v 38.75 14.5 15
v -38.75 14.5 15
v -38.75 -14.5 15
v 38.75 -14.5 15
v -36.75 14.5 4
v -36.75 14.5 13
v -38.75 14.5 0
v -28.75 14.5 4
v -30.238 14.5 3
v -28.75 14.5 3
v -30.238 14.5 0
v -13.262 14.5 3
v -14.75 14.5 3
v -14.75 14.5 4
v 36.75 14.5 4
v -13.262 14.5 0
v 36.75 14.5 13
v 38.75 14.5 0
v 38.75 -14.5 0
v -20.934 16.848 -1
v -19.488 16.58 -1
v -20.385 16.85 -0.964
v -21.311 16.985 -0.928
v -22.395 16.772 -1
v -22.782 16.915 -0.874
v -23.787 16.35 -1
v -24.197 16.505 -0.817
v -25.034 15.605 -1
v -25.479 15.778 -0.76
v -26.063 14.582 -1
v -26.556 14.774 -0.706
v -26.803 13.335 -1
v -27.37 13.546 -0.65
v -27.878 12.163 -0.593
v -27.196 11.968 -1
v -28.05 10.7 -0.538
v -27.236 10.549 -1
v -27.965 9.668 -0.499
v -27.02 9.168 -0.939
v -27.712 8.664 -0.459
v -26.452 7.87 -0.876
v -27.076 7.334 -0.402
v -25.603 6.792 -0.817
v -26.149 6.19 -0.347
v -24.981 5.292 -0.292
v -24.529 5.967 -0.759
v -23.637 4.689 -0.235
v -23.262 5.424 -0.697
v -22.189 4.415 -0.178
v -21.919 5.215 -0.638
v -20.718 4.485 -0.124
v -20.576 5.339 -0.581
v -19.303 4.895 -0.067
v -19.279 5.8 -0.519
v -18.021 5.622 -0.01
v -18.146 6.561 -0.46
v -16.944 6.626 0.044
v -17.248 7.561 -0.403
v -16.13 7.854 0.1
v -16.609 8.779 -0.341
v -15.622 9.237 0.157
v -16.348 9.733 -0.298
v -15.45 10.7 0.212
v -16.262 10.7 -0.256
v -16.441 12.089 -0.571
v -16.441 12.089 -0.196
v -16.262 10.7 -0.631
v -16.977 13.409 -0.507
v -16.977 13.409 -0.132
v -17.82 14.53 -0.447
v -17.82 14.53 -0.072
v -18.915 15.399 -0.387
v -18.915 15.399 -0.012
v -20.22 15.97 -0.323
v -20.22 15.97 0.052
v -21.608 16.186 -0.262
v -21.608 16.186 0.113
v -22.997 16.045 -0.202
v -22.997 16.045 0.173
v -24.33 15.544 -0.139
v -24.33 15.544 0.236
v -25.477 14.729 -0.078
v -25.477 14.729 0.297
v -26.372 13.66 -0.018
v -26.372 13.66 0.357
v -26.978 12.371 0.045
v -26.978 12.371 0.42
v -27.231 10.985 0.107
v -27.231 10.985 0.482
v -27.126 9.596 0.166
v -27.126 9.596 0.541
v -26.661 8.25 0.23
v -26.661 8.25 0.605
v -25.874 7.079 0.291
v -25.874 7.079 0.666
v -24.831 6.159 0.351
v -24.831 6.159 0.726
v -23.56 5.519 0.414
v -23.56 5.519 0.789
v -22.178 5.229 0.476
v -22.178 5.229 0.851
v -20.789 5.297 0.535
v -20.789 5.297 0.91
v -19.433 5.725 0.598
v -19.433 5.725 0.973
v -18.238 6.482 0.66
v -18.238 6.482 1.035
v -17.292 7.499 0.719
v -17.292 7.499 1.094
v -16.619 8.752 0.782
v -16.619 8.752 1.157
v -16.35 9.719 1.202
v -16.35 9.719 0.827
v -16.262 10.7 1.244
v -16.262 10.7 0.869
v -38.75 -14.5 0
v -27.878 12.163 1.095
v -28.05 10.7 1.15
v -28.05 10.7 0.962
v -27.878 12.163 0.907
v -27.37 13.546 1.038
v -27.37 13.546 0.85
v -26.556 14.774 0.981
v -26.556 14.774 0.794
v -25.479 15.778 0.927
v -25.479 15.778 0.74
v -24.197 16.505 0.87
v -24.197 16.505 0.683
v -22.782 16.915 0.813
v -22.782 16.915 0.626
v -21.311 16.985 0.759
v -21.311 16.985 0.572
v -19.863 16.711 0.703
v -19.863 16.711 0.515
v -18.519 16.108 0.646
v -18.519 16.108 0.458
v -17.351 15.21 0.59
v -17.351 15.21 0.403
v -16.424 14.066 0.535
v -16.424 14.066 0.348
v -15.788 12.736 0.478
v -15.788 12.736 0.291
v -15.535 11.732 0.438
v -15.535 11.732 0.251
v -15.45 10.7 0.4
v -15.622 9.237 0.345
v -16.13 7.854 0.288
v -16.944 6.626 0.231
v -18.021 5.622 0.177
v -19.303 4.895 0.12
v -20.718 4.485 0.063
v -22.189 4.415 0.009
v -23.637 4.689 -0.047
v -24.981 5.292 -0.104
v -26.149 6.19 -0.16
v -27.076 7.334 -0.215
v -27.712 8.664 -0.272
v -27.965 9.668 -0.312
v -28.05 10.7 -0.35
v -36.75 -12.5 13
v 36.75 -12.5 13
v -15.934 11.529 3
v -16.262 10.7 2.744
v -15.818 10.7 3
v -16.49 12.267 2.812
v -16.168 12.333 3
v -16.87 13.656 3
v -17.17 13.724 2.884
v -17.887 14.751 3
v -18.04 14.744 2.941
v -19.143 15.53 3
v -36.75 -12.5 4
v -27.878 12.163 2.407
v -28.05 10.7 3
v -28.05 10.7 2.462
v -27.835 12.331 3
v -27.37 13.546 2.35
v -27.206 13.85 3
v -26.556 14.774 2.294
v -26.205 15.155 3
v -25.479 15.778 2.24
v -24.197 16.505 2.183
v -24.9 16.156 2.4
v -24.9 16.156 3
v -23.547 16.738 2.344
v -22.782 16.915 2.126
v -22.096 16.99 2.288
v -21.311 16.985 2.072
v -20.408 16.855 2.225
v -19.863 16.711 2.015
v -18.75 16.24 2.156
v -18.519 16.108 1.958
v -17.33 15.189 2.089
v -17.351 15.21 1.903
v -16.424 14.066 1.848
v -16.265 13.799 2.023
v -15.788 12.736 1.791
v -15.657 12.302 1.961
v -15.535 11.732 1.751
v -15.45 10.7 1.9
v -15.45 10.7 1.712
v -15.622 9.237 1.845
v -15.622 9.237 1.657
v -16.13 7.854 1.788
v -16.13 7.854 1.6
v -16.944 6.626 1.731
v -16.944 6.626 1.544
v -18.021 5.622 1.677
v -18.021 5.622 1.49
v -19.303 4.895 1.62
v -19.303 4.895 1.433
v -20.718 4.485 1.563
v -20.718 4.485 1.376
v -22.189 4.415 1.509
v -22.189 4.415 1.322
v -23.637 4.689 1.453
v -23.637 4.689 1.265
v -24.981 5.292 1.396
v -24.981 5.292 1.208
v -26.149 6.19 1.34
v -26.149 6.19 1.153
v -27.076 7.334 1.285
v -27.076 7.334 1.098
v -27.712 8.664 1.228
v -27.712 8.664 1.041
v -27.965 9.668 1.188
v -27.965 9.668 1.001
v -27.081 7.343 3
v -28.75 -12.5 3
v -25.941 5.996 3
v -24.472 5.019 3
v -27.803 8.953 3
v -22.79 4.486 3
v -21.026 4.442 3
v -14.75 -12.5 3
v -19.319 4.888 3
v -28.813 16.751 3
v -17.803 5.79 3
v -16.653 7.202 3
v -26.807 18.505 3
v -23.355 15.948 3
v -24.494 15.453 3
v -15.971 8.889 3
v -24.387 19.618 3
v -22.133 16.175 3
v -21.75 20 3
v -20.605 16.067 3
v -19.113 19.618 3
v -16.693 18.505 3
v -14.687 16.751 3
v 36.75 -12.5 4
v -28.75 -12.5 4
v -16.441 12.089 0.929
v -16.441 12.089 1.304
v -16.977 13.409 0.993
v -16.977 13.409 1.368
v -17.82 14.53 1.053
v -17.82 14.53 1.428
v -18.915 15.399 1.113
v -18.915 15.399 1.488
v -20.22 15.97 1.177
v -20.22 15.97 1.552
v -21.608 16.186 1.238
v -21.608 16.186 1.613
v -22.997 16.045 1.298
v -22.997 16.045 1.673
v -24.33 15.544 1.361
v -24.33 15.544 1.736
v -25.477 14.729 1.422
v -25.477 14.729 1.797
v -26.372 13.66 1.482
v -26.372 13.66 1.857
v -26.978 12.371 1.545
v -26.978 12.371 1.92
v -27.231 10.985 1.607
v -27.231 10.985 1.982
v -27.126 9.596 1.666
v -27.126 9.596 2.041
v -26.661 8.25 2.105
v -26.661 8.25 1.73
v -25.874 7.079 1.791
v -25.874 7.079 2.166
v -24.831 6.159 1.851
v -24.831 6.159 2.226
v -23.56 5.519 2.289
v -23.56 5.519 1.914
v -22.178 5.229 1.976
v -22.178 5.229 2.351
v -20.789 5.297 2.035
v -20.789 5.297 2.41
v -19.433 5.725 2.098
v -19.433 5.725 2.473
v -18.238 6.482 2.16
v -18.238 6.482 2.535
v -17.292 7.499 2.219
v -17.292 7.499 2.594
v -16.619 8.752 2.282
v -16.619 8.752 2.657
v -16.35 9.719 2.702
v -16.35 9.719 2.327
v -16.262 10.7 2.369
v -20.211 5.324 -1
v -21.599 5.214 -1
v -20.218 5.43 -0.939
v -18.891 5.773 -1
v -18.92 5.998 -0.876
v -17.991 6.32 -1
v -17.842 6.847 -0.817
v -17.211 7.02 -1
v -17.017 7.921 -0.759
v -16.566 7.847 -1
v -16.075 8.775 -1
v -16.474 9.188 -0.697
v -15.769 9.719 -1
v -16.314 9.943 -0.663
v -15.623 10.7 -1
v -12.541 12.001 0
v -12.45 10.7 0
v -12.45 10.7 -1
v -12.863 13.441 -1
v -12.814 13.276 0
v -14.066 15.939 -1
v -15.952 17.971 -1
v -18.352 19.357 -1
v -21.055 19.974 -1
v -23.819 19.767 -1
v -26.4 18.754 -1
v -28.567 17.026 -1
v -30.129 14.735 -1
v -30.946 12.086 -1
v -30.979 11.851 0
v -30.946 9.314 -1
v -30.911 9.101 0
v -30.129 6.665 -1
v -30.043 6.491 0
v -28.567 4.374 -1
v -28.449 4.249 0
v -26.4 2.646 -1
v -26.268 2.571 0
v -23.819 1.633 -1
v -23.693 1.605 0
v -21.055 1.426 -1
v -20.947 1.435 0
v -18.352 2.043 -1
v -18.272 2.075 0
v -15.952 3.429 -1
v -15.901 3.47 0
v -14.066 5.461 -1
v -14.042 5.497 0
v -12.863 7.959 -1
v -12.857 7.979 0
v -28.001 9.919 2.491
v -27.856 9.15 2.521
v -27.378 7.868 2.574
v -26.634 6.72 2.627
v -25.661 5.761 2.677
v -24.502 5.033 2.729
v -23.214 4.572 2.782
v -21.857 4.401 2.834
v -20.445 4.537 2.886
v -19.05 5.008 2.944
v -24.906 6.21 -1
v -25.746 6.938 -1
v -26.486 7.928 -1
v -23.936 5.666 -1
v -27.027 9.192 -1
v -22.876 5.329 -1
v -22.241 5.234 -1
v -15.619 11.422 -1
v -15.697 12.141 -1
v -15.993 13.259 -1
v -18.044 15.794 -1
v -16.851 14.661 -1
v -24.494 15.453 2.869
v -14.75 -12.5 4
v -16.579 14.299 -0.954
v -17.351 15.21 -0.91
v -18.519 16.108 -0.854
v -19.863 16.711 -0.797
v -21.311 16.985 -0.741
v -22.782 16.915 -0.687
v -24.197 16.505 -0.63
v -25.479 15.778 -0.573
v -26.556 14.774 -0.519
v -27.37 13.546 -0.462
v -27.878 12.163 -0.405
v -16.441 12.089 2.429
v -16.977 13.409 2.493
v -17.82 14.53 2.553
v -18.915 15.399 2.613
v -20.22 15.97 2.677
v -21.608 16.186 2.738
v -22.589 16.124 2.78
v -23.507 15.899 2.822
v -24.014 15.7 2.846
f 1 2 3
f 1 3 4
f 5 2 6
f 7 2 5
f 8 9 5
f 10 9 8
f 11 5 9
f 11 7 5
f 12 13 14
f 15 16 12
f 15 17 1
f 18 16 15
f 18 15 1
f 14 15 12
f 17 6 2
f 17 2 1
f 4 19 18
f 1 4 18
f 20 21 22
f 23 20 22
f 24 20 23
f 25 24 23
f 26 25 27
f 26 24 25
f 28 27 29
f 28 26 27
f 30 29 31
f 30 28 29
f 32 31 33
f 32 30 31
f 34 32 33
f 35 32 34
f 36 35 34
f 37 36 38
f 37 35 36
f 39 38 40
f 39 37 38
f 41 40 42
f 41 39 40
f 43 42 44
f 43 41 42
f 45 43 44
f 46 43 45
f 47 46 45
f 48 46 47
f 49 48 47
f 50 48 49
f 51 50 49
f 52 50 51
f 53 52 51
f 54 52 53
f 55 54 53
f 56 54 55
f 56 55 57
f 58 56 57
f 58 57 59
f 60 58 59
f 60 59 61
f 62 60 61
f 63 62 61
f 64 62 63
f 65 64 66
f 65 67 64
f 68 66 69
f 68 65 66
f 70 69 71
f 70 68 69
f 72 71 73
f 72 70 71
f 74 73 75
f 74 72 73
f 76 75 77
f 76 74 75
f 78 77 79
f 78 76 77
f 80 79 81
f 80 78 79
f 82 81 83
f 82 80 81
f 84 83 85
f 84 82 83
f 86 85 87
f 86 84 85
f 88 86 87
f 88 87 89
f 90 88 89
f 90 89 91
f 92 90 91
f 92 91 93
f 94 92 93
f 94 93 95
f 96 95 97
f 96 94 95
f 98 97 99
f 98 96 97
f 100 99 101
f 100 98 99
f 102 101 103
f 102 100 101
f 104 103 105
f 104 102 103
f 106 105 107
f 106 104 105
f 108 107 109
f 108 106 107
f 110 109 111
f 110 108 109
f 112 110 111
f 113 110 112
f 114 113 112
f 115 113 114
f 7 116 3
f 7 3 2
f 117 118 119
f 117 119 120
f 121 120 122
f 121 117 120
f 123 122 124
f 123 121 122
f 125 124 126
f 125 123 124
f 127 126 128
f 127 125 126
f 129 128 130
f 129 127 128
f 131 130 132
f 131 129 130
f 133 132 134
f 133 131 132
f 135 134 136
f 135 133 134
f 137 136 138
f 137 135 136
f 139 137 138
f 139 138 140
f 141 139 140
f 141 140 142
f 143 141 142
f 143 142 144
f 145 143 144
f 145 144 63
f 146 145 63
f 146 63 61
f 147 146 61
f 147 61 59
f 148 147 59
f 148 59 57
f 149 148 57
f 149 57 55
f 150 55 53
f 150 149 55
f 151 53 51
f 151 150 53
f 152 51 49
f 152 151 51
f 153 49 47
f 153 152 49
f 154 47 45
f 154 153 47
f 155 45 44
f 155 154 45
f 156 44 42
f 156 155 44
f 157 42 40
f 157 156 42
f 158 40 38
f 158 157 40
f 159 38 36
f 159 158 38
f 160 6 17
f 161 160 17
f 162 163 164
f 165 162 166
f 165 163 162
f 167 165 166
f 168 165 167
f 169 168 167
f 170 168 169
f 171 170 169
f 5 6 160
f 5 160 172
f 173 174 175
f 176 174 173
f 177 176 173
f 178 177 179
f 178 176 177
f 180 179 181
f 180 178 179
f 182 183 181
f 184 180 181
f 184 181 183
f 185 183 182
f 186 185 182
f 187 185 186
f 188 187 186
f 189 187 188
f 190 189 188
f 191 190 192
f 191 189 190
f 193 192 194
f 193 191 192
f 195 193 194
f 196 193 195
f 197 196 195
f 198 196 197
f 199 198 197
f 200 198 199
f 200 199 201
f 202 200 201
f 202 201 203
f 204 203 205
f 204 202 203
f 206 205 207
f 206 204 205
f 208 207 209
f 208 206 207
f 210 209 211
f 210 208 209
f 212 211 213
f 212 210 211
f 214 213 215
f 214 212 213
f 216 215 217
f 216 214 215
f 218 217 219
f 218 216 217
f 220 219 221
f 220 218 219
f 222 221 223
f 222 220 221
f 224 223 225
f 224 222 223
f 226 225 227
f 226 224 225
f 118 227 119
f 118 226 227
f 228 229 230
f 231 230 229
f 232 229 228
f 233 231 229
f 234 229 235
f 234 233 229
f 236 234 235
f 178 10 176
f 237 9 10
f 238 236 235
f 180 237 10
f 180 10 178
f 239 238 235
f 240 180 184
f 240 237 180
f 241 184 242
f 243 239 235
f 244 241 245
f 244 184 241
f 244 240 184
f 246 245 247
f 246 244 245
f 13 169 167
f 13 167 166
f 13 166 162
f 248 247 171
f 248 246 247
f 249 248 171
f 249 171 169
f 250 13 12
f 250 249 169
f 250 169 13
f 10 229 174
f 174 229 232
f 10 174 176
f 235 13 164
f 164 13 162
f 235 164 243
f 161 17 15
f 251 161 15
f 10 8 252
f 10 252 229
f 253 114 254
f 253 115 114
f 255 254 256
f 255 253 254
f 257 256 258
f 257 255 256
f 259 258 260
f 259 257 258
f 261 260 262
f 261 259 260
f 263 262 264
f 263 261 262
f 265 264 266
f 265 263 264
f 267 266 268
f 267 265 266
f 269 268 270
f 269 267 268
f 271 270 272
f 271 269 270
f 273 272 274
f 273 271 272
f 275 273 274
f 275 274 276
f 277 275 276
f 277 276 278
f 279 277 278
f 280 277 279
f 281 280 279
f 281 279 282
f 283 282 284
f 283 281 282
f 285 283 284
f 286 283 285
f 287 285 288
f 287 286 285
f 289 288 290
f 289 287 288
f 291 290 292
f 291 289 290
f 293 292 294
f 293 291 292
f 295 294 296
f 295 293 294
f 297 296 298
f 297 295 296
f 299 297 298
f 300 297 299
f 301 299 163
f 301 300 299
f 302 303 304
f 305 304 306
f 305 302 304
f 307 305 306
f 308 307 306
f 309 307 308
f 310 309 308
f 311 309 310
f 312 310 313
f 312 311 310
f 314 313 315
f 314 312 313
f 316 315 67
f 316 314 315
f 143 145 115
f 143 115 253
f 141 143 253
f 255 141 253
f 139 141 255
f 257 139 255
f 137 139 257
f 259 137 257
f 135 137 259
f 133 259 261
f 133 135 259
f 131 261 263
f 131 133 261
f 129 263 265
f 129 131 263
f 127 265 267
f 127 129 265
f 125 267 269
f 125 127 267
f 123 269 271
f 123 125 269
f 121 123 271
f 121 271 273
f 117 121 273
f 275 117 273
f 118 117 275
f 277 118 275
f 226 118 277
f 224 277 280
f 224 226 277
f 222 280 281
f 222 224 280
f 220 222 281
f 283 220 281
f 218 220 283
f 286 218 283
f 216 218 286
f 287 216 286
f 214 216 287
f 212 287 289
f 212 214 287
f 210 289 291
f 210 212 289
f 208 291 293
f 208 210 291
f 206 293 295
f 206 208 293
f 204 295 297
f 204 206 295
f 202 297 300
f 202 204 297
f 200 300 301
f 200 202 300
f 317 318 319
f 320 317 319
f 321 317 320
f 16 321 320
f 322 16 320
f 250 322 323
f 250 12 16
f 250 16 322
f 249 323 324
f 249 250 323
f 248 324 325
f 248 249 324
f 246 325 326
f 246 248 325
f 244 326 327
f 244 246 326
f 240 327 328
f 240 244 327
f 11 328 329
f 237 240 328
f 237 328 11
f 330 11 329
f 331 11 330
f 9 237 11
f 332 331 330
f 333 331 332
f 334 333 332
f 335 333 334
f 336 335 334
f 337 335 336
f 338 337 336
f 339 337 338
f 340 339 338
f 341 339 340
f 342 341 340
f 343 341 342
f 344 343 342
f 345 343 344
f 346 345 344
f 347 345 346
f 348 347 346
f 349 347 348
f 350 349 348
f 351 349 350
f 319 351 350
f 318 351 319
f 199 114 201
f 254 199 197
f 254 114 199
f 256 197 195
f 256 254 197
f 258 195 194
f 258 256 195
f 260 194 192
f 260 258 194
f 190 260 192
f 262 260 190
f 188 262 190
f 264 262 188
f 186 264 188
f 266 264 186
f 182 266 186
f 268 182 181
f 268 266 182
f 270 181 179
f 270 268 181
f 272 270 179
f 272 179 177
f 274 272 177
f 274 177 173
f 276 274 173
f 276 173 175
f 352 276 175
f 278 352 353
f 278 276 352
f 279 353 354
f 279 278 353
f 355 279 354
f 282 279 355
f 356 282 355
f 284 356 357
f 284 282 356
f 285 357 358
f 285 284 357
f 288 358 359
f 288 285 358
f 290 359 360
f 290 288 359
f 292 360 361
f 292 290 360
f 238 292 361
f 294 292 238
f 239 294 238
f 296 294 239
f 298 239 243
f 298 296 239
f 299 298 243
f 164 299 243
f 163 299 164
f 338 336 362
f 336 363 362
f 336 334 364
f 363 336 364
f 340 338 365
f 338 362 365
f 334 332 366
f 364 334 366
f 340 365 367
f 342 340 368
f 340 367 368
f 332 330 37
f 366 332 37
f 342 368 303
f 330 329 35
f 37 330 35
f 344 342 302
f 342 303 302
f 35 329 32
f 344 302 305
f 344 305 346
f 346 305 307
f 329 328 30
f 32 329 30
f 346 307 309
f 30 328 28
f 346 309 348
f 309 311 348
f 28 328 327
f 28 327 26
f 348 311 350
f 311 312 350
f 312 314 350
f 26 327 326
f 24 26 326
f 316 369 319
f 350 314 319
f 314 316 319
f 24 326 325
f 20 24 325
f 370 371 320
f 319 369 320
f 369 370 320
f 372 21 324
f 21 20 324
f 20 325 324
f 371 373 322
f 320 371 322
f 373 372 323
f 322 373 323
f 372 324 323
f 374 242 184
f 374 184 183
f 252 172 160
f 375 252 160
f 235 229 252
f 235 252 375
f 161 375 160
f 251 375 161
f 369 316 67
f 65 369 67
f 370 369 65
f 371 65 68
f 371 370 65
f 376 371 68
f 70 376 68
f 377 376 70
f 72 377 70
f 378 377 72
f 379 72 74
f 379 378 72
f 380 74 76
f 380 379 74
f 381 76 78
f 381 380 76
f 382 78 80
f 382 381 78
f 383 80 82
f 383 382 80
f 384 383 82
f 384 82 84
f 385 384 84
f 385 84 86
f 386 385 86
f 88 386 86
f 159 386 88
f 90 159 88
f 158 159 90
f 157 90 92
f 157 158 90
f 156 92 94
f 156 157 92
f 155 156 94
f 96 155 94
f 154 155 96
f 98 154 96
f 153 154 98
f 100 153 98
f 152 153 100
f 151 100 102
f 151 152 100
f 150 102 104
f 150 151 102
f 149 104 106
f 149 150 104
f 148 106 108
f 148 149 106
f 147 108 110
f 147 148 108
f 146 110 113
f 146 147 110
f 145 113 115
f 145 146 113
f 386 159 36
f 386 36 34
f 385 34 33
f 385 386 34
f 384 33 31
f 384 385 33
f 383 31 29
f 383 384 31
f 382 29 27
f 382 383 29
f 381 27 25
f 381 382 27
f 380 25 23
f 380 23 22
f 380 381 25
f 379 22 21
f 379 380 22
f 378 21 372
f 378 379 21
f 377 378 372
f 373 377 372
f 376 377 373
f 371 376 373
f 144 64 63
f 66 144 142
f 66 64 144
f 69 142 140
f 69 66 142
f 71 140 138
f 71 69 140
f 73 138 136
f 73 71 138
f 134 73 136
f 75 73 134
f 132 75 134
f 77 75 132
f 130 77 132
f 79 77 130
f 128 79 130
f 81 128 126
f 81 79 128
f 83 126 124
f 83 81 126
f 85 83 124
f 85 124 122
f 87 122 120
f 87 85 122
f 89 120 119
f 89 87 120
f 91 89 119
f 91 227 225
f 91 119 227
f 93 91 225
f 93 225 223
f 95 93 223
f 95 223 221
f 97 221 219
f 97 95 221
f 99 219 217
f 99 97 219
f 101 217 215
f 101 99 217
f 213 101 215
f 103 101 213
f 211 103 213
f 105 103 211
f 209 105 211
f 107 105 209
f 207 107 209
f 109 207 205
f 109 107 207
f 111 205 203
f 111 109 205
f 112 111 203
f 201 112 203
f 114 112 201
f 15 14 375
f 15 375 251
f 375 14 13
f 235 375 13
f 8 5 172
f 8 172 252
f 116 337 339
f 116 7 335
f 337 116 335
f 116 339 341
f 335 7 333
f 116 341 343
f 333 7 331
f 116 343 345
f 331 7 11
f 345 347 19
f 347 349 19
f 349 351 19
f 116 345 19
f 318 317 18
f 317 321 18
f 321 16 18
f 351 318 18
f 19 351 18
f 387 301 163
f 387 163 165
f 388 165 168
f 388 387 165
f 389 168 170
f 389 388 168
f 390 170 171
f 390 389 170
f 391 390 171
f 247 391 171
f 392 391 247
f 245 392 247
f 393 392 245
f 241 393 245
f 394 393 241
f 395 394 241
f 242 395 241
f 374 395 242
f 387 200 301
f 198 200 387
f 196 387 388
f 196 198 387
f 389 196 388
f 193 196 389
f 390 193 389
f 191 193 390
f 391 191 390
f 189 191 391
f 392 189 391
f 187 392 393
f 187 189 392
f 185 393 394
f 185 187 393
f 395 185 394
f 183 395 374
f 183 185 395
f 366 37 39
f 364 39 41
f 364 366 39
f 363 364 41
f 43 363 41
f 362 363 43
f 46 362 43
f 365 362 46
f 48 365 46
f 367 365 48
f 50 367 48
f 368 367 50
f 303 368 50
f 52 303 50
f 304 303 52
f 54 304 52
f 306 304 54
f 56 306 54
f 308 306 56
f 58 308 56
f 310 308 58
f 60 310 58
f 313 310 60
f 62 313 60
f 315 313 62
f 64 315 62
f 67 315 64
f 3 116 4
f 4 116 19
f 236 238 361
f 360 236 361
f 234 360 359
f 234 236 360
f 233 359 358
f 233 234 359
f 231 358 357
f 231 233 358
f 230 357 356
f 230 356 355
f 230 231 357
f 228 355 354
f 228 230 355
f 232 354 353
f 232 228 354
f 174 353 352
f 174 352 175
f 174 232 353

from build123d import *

# Parameters (mm, degrees)
SKIZZE1_W                            = 77.5
SKIZZE1_H                            = 29
AUFSATZ_LINEAR_AUSTRAGEN1_DEPTH      = 15
SKIZZE2_W                            = 73.5
SKIZZE2_H                            = 9
SCHNITT_LINEAR_AUSTRAGEN2_DEPTH      = 27
SKIZZE3_W                            = 14
SKIZZE3_H                            = 3.775324495
SCHNITT_LINEAR_AUSTRAGEN3_DEPTH      = 27
SKIZZE4_R                            = 9.3
AUFSATZ_LINEAR_AUSTRAGEN2_DEPTH      = 4
SCHNITT_LINEAR_AUSTRAGEN4_DEPTH      = 4
SCHNITT_LINEAR_AUSTRAGEN4_DEPTH_BACK = 4
SKIZZE5_R                            = 6.3
GEWINDE1_PITCH                       = 1.5
SKIZZE8_R                            = 6.762792794
SCHNITT_LINEAR_AUSTRAGEN5_DEPTH      = 3
SKIZZE9_R                            = 8.045184368
SCHNITT_LINEAR_AUSTRAGEN6_DEPTH      = 3


with BuildPart() as part:
    # Skizze1 → Aufsatz-Linear austragen1 (new body)
    with BuildSketch(Plane.XY):
        Rectangle(SKIZZE1_W, SKIZZE1_H)
    extrude(amount=AUFSATZ_LINEAR_AUSTRAGEN1_DEPTH)

    # Skizze2 → Schnitt-Linear austragen2 (cut)
    with BuildSketch(Plane(origin=(0, 14.5, 0), x_dir=(1, 0, 0), z_dir=(0, 1, 0))):
        with Locations((0, -8.5)):
            Rectangle(SKIZZE2_W, SKIZZE2_H)
    extrude(amount=-SCHNITT_LINEAR_AUSTRAGEN2_DEPTH, mode=Mode.SUBTRACT)

    # Skizze3 → Schnitt-Linear austragen3 (cut)
    with BuildSketch(Plane(origin=(0, 14.5, 0), x_dir=(1, 0, 0), z_dir=(0, 1, 0))):
        with Locations((-21.75, -4.887662247)):
            Rectangle(SKIZZE3_W, SKIZZE3_H)
    extrude(amount=-SCHNITT_LINEAR_AUSTRAGEN3_DEPTH, mode=Mode.SUBTRACT)

    # Skizze4 → Aufsatz-Linear austragen2 (add)
    with BuildSketch(Plane.XY.offset(3)):
        with Locations((-21.75, 10.7)):
            Circle(SKIZZE4_R)
    extrude(amount=-AUFSATZ_LINEAR_AUSTRAGEN2_DEPTH)

    # Skizze5 → Schnitt-Linear austragen4 (cut, two sides: drawn at the far end of the back side and taken through both)
    with BuildSketch(Plane(origin=(0, 0, 0), x_dir=(-1, 0, 0), z_dir=(0, 0, -1)).offset(-SCHNITT_LINEAR_AUSTRAGEN4_DEPTH_BACK)):
        with Locations((21.75, 10.7)):
            Circle(SKIZZE5_R)
    extrude(amount=SCHNITT_LINEAR_AUSTRAGEN4_DEPTH + SCHNITT_LINEAR_AUSTRAGEN4_DEPTH_BACK, mode=Mode.SUBTRACT)

    # Gewinde1: the profile of Gewindeprofil1 profile screwed along a right-hand helix of 3.333333 turns, 8 arcs to a turn; built about Z, then put on its axis
    gewinde1_z = Axis((0, 0, 0), (0, 0, 1))
    gewinde1_corners = [(6.3003, 0, -0.000173205), (6.3003, 0, 1.312673201), (5.488101188, 0, 0.843749998), (5.488101188, 0, 0.468749998)]
    with BuildLine(mode=Mode.PRIVATE) as gewinde1_profile:
        Line(gewinde1_corners[0], gewinde1_corners[1])
        Line(gewinde1_corners[1], gewinde1_corners[2])
        Line(gewinde1_corners[2], gewinde1_corners[3])
        Line(gewinde1_corners[3], gewinde1_corners[0])
    gewinde1_cap = Face(gewinde1_profile.wire())
    gewinde1_turn_angles = [0, 22.5, 45, 67.5, 90, 112.5, 135, 157.5, 180, 202.5, 225, 247.5, 270, 292.5, 315, 337.5, 360]
    gewinde1_turn_weights = [1, 0.9238795325112867, 1, 0.9238795325112867, 1, 0.9238795325112867, 1, 0.9238795325112867, 1, 0.9238795325112867, 1, 0.9238795325112867, 1, 0.9238795325112867, 1, 0.9238795325112867, 1]
    gewinde1_turn_rails = [Edge.make_bspline([Vector(p[0], p[1], 0).rotate(gewinde1_z, gewinde1_turn_angles[k]) / gewinde1_turn_weights[k] + Vector(0, 0, p[2] + GEWINDE1_PITCH * gewinde1_turn_angles[k] / 360) for k in range(17)], [0, 0, 0, 1, 1, 2, 2, 3, 3, 4, 4, 5, 5, 6, 6, 7, 7, 8, 8, 8], 2, gewinde1_turn_weights) for p in gewinde1_corners]
    gewinde1_turn_sides = [Face.make_surface_from_curves(gewinde1_turn_rails[p[0]], gewinde1_turn_rails[p[1]]) for p in [(0, 1), (1, 2), (2, 3), (3, 0)]]
    gewinde1_last_angles = [1080, 1102.5, 1125, 1147.5, 1170, 1185, 1200]
    gewinde1_last_weights = [1, 0.9238795325112867, 1, 0.9238795325112867, 1, 0.9659258262890688, 1]
    gewinde1_last_rails = [Edge.make_bspline([Vector(p[0], p[1], 0).rotate(gewinde1_z, gewinde1_last_angles[k]) / gewinde1_last_weights[k] + Vector(0, 0, p[2] + GEWINDE1_PITCH * gewinde1_last_angles[k] / 360) for k in range(7)], [0, 0, 0, 1, 1, 2, 2, 3, 3, 3], 2, gewinde1_last_weights) for p in gewinde1_corners]
    gewinde1_last_sides = [Face.make_surface_from_curves(gewinde1_last_rails[p[0]], gewinde1_last_rails[p[1]]) for p in [(0, 1), (1, 2), (2, 3), (3, 0)]]
    gewinde1 = Plane(origin=(-21.75, 10.7, -2.6), x_dir=(1, 0, 0), z_dir=(0, 0, 1)) * Solid(Shell([*[p.moved(Location((0, 0, GEWINDE1_PITCH * i))) for i in range(3) for p in gewinde1_turn_sides], *gewinde1_last_sides, gewinde1_cap, gewinde1_cap.rotate(gewinde1_z, 1200).moved(Location((0, 0, GEWINDE1_PITCH * 1200 / 360)))]))
    add(gewinde1)

    # Skizze8 → Schnitt-Linear austragen5 (cut)
    with BuildSketch(Plane.XY.offset(3)):
        with Locations((-21.75, 10.7)):
            Circle(SKIZZE8_R)
    extrude(amount=SCHNITT_LINEAR_AUSTRAGEN5_DEPTH, mode=Mode.SUBTRACT)

    # Skizze9 → Schnitt-Linear austragen6 (cut)
    with BuildSketch(Plane(origin=(0, 0, -1), x_dir=(-1, 0, 0), z_dir=(0, 0, -1))):
        with Locations((21.75, 10.7)):
            Circle(SKIZZE9_R)
    extrude(amount=SCHNITT_LINEAR_AUSTRAGEN6_DEPTH, mode=Mode.SUBTRACT)


solid = part.part
